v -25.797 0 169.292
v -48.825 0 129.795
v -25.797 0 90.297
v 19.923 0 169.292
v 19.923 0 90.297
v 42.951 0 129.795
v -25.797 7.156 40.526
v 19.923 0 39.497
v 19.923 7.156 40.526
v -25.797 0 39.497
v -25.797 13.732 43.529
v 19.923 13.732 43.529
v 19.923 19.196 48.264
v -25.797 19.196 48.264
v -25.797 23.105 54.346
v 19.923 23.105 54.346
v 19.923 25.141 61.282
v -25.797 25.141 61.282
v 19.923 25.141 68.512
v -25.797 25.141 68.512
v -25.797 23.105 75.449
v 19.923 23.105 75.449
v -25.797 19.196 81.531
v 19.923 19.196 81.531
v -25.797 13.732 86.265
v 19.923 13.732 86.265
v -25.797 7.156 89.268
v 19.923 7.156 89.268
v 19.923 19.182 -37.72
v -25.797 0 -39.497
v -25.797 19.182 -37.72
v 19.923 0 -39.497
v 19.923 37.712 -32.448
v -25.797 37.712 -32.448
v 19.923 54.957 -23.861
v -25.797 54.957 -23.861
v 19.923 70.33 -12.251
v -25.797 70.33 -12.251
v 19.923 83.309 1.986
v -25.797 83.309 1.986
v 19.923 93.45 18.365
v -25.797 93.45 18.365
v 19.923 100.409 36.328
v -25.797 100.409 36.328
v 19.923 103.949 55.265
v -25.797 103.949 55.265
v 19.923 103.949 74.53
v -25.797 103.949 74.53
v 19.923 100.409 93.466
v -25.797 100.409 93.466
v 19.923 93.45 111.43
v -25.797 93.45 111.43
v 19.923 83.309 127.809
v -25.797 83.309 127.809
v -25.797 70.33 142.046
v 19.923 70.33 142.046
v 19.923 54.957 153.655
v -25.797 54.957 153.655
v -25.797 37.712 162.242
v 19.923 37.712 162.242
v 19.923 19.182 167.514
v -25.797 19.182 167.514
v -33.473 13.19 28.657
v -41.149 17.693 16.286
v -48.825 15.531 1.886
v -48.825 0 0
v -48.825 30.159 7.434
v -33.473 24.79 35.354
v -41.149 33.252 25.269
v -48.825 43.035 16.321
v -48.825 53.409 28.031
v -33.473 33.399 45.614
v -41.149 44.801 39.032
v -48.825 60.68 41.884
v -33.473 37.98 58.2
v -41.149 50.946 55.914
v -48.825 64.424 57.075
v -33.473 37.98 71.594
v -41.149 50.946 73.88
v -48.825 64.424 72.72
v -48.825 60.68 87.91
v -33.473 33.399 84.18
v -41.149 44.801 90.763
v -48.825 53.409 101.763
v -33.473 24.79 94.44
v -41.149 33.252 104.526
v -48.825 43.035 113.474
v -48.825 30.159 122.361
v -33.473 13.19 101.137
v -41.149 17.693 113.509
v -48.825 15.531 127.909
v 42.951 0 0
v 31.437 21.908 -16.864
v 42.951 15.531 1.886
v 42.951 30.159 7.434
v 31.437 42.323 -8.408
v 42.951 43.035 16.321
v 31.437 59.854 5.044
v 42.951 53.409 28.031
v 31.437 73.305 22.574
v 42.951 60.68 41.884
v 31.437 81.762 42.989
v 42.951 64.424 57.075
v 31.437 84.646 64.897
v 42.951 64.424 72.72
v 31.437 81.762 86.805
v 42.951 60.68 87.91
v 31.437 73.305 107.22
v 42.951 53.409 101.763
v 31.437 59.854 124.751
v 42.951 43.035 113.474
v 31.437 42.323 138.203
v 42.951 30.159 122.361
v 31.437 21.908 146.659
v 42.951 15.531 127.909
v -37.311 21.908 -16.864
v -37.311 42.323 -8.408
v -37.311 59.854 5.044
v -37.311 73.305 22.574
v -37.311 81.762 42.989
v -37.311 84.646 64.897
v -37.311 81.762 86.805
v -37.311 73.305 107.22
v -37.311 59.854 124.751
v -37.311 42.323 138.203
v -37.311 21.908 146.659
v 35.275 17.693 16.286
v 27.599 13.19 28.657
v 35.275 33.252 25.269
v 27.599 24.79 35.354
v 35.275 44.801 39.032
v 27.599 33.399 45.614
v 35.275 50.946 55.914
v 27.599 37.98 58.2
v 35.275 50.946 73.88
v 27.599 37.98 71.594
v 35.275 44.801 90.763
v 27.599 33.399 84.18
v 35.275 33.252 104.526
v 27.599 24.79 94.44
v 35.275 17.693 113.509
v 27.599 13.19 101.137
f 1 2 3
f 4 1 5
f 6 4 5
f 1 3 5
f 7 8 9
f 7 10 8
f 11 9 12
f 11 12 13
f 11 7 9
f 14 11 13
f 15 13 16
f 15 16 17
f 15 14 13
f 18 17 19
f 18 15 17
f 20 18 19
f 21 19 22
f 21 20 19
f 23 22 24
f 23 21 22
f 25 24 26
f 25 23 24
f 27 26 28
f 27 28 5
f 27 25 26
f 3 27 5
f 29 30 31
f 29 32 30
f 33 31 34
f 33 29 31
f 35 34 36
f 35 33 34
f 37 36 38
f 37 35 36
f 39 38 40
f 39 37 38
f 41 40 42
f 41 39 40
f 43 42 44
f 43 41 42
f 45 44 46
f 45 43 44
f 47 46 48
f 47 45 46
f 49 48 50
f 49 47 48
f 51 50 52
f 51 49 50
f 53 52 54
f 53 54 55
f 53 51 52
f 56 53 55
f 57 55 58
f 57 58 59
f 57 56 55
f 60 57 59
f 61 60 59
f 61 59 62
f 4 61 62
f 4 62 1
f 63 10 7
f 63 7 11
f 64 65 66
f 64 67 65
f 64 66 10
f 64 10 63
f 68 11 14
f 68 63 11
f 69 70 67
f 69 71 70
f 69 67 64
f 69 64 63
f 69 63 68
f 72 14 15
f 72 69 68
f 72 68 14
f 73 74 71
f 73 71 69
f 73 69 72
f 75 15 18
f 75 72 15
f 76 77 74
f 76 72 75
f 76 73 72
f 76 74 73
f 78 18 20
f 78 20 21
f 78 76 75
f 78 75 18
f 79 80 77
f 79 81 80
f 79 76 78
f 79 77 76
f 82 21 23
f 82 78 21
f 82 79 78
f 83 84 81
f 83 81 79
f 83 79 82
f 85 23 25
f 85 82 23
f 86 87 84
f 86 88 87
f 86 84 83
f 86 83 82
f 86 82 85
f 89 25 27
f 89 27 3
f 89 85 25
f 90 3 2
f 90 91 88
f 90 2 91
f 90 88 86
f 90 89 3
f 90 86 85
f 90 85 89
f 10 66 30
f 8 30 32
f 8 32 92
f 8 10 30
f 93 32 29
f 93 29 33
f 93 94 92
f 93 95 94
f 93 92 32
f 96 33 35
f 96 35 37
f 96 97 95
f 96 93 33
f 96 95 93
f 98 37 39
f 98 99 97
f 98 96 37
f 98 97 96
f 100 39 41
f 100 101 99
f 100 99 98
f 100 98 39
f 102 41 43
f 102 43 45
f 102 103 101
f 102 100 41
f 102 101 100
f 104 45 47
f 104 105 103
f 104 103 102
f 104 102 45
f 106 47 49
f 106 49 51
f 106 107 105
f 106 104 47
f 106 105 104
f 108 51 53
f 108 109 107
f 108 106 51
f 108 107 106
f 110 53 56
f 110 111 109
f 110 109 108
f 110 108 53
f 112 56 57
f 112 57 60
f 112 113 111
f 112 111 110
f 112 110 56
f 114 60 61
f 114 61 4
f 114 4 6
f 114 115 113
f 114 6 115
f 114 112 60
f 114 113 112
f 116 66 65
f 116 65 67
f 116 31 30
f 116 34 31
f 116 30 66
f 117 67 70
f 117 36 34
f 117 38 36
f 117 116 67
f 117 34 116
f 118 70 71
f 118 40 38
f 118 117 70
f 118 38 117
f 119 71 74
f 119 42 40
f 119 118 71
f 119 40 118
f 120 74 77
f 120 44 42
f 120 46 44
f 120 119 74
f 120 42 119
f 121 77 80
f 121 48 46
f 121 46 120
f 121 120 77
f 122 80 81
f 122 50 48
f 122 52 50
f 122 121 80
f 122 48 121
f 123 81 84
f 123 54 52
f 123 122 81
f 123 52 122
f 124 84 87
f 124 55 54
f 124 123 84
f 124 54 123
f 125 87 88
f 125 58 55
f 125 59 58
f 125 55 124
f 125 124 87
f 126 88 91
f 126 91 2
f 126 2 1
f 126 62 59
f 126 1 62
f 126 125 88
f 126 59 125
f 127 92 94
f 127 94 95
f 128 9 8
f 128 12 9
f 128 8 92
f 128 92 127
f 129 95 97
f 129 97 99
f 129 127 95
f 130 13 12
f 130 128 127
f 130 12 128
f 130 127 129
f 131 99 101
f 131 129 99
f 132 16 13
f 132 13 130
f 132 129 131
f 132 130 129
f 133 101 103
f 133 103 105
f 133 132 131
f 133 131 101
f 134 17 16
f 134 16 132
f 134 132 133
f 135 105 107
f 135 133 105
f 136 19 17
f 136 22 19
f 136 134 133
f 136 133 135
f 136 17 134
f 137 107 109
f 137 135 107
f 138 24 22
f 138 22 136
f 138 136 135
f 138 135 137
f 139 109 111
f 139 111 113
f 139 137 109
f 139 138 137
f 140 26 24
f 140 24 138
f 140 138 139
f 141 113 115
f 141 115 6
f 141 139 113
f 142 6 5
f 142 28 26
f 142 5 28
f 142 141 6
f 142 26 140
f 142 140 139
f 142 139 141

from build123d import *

# Parameters (mm, degrees)
F2_ANGLE = 180


with BuildPart() as f2:
    # F0 (on Front) → F2 (revolve)
    with BuildSketch(Plane.XZ):
        Polygon((42.950819, 0), (-48.825024, 0), (-25.797102, -39.497256), (19.922898, -39.497256), align=None)
        Polygon((-25.797102, 39.497256), (-48.825024, 0), (42.950819, 0), (19.922898, 39.497256), align=None)
    revolve(axis=Axis((-2.501527, 0, 64.897256), (1, 0, 0)), revolution_arc=F2_ANGLE)


solid = f2.part
